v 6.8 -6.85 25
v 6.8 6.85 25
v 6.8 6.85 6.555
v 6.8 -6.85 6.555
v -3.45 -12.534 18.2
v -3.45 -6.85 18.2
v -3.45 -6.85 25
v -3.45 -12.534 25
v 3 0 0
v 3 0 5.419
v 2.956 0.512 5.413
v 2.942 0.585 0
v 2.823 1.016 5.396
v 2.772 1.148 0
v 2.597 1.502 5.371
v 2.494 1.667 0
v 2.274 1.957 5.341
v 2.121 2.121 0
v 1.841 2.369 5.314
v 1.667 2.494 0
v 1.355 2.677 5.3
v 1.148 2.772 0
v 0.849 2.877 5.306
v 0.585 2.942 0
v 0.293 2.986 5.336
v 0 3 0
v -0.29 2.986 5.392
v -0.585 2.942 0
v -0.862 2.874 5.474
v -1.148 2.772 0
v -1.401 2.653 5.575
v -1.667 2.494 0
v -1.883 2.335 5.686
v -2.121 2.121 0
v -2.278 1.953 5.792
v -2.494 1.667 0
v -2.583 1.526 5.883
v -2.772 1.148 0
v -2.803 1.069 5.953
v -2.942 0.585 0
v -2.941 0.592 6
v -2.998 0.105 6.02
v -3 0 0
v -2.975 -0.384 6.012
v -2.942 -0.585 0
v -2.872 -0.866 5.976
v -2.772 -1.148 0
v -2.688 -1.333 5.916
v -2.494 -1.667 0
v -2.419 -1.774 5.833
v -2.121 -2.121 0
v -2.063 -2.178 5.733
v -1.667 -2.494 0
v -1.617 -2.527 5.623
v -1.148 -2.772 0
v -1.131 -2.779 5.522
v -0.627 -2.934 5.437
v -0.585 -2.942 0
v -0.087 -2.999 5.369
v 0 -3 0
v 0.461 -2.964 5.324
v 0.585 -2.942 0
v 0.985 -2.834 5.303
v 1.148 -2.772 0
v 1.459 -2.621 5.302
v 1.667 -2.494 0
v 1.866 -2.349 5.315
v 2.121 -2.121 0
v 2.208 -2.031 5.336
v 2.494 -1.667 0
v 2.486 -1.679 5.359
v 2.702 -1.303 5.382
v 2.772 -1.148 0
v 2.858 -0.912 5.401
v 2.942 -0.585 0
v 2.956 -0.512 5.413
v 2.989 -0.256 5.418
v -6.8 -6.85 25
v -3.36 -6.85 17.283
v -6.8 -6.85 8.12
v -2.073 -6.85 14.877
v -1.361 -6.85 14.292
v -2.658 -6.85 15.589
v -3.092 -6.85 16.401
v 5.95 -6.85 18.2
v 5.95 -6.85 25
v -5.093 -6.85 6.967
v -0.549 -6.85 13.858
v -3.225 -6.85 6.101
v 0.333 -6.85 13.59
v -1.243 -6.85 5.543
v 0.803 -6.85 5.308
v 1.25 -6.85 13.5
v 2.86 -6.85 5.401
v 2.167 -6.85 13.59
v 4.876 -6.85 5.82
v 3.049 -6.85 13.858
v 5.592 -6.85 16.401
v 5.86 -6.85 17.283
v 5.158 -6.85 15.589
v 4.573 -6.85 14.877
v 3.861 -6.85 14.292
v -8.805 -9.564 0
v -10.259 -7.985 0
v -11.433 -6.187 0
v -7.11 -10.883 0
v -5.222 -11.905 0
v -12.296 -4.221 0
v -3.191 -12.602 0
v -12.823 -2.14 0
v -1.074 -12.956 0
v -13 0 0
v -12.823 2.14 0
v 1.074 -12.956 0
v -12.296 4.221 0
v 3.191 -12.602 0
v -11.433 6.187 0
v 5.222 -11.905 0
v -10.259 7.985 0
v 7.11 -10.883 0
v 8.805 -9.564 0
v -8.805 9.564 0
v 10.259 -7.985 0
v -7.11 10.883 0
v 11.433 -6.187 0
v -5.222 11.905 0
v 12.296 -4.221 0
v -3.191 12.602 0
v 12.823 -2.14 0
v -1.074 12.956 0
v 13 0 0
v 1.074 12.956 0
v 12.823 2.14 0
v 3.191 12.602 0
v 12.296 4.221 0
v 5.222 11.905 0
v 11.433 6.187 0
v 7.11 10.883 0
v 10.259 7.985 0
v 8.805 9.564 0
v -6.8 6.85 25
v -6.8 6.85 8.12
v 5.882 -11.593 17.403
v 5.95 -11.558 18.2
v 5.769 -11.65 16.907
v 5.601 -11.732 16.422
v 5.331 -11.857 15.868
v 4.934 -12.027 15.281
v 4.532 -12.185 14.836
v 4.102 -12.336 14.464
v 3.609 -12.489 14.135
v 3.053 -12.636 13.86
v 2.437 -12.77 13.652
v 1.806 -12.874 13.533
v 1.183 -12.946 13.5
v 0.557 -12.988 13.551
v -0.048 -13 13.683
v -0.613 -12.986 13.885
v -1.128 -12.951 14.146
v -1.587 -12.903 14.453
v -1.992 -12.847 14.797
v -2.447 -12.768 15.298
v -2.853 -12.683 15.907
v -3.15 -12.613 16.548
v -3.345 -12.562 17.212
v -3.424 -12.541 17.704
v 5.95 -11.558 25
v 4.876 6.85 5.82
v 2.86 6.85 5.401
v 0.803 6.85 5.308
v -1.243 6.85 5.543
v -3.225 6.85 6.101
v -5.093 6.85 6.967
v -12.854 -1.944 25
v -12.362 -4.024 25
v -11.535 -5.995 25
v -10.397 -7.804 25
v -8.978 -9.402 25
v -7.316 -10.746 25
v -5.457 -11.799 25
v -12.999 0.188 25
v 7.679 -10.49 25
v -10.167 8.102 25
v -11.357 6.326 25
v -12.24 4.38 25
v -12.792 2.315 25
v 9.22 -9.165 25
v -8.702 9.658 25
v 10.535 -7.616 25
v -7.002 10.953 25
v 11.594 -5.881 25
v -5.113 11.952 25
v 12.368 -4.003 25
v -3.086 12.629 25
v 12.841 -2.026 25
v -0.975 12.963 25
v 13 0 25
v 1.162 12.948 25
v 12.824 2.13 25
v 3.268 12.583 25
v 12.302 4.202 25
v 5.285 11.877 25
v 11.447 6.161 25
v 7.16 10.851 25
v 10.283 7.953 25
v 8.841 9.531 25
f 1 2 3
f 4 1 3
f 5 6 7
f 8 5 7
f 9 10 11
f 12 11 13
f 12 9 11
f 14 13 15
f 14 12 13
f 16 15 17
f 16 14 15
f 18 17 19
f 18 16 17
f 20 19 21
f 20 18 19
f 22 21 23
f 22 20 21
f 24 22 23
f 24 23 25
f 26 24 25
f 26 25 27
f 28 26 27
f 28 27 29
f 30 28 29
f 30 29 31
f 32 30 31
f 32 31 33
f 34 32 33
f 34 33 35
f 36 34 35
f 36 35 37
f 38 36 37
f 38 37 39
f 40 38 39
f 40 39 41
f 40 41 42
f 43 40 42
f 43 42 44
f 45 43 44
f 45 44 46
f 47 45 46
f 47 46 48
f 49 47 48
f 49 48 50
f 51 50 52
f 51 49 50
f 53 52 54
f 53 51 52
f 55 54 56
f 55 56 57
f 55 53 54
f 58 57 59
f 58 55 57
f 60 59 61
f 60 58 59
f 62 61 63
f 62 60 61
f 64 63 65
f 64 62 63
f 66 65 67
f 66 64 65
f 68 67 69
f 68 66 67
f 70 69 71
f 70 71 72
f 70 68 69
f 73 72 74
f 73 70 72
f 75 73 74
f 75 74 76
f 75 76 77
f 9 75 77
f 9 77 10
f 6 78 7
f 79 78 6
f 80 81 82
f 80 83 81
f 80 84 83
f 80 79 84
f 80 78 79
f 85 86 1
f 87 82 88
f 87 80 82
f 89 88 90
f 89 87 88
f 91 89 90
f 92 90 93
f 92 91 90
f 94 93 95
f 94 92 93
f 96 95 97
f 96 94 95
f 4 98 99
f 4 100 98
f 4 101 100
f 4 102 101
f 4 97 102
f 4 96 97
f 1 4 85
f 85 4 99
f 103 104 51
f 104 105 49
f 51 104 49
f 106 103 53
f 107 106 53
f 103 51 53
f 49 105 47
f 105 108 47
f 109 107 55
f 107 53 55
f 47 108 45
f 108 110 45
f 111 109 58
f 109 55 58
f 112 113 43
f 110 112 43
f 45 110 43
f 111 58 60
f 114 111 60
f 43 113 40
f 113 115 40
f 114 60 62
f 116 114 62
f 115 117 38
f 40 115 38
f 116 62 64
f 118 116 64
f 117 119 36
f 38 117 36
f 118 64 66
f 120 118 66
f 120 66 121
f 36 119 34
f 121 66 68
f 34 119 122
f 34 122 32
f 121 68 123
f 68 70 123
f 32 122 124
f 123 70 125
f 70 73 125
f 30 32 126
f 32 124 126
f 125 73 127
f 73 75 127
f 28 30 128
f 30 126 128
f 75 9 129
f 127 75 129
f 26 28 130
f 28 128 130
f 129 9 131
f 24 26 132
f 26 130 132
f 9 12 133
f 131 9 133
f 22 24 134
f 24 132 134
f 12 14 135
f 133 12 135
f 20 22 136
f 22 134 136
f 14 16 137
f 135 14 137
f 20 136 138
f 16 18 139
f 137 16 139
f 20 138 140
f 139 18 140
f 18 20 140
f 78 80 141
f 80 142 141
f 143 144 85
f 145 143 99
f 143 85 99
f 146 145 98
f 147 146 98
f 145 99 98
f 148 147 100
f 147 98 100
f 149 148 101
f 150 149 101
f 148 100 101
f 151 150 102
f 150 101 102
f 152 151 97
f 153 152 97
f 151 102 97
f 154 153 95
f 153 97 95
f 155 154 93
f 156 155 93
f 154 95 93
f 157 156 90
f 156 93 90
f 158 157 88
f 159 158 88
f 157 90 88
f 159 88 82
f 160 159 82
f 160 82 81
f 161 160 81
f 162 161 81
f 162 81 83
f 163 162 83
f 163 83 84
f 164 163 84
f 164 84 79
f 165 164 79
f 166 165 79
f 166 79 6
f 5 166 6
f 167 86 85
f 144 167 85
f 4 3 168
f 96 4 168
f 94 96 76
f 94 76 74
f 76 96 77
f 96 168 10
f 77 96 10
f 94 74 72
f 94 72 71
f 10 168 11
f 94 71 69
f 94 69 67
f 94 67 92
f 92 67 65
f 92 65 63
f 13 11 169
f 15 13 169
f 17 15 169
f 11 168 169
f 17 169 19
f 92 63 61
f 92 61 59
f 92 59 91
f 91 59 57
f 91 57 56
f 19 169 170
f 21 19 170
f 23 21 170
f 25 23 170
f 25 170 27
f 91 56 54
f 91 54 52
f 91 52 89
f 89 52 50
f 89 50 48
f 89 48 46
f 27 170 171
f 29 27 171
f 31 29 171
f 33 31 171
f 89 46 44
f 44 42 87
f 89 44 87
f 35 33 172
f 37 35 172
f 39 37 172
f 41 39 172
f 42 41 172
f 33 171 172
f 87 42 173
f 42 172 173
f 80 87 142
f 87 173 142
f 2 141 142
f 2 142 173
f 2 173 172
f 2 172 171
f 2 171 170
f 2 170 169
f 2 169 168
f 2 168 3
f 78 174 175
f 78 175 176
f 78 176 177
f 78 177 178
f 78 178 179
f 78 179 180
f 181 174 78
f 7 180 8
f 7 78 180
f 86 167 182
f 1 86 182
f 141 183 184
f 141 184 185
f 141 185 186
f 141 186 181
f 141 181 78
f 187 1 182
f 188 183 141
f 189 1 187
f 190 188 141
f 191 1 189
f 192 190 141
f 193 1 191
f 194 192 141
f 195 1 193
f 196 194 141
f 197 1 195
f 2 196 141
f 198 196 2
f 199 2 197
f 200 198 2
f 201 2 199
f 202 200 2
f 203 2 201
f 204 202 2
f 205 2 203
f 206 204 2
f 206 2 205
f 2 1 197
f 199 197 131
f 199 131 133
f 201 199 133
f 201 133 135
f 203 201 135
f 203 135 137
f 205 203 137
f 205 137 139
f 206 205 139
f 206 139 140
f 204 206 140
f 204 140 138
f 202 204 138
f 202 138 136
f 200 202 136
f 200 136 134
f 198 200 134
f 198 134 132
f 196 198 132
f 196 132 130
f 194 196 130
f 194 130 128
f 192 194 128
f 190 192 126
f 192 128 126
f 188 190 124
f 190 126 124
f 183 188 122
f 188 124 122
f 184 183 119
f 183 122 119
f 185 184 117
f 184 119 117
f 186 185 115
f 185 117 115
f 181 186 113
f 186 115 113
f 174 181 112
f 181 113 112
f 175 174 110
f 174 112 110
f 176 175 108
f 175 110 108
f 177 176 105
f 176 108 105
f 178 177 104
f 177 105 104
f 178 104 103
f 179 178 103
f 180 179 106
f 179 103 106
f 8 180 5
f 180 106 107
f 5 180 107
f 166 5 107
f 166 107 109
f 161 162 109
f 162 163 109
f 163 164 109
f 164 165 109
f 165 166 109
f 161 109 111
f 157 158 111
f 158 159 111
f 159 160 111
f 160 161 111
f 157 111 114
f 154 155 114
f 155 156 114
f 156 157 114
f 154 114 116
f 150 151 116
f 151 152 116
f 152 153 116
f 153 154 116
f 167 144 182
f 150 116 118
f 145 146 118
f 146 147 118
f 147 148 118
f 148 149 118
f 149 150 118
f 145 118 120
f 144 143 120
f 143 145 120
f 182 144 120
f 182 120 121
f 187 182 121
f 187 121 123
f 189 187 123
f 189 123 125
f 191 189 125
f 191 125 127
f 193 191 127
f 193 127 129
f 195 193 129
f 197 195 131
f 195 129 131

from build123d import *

# Parameters (mm, degrees)
SKETCH1_R               = 13
SKETCH1_R_2             = 3
BOSS_EXTRUDE1_DEPTH     = 25
CUT_EXTRUDE1_DEPTH      = 6.85
CUT_EXTRUDE2_REACH      = 33.032
CUT_EXTRUDE2_END_RADIUS = 13


with BuildPart() as part:
    # Sketch1 → Boss-Extrude1 (new body)
    with BuildSketch(Plane.XY):
        Circle(SKETCH1_R)
        Circle(SKETCH1_R_2, mode=Mode.SUBTRACT)
    extrude(amount=BOSS_EXTRUDE1_DEPTH)

    # Sketch2 → Cut-Extrude1 (cut, symmetric)
    with BuildSketch(Plane(origin=(0, 0, 0), x_dir=(1, 0, 0), z_dir=(0, 1, 0))):
        with BuildLine():
            Line((-6.8, -25), (6.8, -25))
            Line((6.8, -25), (6.8, -6.554936668))
            ThreePointArc((6.8, -6.554936668), (-0.224724758, -5.38457231), (-6.8, -8.119945437))
            Line((-6.8, -8.119945437), (-6.8, -25))
        make_face()
    extrude(amount=CUT_EXTRUDE1_DEPTH, both=True, mode=Mode.SUBTRACT)

    # Cut-Extrude2: up to this cylinder (the profile starts inside it)
    cut_extrude2_end = Plane(origin=(0, 0, 19.701869), z_dir=(0, 0, -1)) * Cylinder(CUT_EXTRUDE2_END_RADIUS, 93.064, mode=Mode.PRIVATE)
    # Sketch3 → Cut-Extrude2 (cut, up to the surface)
    with BuildSketch(Plane(origin=(0, 0, 0), x_dir=(1, 0, 0), z_dir=(0, 1, 0)), mode=Mode.PRIVATE) as cut_extrude2_sk1:
        with BuildLine():
            Line((-3.45, -18.2), (-3.45, -25))
            Line((-3.45, -25), (5.95, -25))
            Line((5.95, -25), (5.95, -18.2))
            ThreePointArc((5.95, -18.2), (1.25, -13.5), (-3.45, -18.2))
        make_face()
    cut_extrude2_tool1 = extrude(cut_extrude2_sk1.sketch, amount=-CUT_EXTRUDE2_REACH, mode=Mode.PRIVATE) & cut_extrude2_end
    add(cut_extrude2_tool1.solids().sort_by_distance((1.25, 0, 19.701869))[0], mode=Mode.SUBTRACT)


solid = part.part
